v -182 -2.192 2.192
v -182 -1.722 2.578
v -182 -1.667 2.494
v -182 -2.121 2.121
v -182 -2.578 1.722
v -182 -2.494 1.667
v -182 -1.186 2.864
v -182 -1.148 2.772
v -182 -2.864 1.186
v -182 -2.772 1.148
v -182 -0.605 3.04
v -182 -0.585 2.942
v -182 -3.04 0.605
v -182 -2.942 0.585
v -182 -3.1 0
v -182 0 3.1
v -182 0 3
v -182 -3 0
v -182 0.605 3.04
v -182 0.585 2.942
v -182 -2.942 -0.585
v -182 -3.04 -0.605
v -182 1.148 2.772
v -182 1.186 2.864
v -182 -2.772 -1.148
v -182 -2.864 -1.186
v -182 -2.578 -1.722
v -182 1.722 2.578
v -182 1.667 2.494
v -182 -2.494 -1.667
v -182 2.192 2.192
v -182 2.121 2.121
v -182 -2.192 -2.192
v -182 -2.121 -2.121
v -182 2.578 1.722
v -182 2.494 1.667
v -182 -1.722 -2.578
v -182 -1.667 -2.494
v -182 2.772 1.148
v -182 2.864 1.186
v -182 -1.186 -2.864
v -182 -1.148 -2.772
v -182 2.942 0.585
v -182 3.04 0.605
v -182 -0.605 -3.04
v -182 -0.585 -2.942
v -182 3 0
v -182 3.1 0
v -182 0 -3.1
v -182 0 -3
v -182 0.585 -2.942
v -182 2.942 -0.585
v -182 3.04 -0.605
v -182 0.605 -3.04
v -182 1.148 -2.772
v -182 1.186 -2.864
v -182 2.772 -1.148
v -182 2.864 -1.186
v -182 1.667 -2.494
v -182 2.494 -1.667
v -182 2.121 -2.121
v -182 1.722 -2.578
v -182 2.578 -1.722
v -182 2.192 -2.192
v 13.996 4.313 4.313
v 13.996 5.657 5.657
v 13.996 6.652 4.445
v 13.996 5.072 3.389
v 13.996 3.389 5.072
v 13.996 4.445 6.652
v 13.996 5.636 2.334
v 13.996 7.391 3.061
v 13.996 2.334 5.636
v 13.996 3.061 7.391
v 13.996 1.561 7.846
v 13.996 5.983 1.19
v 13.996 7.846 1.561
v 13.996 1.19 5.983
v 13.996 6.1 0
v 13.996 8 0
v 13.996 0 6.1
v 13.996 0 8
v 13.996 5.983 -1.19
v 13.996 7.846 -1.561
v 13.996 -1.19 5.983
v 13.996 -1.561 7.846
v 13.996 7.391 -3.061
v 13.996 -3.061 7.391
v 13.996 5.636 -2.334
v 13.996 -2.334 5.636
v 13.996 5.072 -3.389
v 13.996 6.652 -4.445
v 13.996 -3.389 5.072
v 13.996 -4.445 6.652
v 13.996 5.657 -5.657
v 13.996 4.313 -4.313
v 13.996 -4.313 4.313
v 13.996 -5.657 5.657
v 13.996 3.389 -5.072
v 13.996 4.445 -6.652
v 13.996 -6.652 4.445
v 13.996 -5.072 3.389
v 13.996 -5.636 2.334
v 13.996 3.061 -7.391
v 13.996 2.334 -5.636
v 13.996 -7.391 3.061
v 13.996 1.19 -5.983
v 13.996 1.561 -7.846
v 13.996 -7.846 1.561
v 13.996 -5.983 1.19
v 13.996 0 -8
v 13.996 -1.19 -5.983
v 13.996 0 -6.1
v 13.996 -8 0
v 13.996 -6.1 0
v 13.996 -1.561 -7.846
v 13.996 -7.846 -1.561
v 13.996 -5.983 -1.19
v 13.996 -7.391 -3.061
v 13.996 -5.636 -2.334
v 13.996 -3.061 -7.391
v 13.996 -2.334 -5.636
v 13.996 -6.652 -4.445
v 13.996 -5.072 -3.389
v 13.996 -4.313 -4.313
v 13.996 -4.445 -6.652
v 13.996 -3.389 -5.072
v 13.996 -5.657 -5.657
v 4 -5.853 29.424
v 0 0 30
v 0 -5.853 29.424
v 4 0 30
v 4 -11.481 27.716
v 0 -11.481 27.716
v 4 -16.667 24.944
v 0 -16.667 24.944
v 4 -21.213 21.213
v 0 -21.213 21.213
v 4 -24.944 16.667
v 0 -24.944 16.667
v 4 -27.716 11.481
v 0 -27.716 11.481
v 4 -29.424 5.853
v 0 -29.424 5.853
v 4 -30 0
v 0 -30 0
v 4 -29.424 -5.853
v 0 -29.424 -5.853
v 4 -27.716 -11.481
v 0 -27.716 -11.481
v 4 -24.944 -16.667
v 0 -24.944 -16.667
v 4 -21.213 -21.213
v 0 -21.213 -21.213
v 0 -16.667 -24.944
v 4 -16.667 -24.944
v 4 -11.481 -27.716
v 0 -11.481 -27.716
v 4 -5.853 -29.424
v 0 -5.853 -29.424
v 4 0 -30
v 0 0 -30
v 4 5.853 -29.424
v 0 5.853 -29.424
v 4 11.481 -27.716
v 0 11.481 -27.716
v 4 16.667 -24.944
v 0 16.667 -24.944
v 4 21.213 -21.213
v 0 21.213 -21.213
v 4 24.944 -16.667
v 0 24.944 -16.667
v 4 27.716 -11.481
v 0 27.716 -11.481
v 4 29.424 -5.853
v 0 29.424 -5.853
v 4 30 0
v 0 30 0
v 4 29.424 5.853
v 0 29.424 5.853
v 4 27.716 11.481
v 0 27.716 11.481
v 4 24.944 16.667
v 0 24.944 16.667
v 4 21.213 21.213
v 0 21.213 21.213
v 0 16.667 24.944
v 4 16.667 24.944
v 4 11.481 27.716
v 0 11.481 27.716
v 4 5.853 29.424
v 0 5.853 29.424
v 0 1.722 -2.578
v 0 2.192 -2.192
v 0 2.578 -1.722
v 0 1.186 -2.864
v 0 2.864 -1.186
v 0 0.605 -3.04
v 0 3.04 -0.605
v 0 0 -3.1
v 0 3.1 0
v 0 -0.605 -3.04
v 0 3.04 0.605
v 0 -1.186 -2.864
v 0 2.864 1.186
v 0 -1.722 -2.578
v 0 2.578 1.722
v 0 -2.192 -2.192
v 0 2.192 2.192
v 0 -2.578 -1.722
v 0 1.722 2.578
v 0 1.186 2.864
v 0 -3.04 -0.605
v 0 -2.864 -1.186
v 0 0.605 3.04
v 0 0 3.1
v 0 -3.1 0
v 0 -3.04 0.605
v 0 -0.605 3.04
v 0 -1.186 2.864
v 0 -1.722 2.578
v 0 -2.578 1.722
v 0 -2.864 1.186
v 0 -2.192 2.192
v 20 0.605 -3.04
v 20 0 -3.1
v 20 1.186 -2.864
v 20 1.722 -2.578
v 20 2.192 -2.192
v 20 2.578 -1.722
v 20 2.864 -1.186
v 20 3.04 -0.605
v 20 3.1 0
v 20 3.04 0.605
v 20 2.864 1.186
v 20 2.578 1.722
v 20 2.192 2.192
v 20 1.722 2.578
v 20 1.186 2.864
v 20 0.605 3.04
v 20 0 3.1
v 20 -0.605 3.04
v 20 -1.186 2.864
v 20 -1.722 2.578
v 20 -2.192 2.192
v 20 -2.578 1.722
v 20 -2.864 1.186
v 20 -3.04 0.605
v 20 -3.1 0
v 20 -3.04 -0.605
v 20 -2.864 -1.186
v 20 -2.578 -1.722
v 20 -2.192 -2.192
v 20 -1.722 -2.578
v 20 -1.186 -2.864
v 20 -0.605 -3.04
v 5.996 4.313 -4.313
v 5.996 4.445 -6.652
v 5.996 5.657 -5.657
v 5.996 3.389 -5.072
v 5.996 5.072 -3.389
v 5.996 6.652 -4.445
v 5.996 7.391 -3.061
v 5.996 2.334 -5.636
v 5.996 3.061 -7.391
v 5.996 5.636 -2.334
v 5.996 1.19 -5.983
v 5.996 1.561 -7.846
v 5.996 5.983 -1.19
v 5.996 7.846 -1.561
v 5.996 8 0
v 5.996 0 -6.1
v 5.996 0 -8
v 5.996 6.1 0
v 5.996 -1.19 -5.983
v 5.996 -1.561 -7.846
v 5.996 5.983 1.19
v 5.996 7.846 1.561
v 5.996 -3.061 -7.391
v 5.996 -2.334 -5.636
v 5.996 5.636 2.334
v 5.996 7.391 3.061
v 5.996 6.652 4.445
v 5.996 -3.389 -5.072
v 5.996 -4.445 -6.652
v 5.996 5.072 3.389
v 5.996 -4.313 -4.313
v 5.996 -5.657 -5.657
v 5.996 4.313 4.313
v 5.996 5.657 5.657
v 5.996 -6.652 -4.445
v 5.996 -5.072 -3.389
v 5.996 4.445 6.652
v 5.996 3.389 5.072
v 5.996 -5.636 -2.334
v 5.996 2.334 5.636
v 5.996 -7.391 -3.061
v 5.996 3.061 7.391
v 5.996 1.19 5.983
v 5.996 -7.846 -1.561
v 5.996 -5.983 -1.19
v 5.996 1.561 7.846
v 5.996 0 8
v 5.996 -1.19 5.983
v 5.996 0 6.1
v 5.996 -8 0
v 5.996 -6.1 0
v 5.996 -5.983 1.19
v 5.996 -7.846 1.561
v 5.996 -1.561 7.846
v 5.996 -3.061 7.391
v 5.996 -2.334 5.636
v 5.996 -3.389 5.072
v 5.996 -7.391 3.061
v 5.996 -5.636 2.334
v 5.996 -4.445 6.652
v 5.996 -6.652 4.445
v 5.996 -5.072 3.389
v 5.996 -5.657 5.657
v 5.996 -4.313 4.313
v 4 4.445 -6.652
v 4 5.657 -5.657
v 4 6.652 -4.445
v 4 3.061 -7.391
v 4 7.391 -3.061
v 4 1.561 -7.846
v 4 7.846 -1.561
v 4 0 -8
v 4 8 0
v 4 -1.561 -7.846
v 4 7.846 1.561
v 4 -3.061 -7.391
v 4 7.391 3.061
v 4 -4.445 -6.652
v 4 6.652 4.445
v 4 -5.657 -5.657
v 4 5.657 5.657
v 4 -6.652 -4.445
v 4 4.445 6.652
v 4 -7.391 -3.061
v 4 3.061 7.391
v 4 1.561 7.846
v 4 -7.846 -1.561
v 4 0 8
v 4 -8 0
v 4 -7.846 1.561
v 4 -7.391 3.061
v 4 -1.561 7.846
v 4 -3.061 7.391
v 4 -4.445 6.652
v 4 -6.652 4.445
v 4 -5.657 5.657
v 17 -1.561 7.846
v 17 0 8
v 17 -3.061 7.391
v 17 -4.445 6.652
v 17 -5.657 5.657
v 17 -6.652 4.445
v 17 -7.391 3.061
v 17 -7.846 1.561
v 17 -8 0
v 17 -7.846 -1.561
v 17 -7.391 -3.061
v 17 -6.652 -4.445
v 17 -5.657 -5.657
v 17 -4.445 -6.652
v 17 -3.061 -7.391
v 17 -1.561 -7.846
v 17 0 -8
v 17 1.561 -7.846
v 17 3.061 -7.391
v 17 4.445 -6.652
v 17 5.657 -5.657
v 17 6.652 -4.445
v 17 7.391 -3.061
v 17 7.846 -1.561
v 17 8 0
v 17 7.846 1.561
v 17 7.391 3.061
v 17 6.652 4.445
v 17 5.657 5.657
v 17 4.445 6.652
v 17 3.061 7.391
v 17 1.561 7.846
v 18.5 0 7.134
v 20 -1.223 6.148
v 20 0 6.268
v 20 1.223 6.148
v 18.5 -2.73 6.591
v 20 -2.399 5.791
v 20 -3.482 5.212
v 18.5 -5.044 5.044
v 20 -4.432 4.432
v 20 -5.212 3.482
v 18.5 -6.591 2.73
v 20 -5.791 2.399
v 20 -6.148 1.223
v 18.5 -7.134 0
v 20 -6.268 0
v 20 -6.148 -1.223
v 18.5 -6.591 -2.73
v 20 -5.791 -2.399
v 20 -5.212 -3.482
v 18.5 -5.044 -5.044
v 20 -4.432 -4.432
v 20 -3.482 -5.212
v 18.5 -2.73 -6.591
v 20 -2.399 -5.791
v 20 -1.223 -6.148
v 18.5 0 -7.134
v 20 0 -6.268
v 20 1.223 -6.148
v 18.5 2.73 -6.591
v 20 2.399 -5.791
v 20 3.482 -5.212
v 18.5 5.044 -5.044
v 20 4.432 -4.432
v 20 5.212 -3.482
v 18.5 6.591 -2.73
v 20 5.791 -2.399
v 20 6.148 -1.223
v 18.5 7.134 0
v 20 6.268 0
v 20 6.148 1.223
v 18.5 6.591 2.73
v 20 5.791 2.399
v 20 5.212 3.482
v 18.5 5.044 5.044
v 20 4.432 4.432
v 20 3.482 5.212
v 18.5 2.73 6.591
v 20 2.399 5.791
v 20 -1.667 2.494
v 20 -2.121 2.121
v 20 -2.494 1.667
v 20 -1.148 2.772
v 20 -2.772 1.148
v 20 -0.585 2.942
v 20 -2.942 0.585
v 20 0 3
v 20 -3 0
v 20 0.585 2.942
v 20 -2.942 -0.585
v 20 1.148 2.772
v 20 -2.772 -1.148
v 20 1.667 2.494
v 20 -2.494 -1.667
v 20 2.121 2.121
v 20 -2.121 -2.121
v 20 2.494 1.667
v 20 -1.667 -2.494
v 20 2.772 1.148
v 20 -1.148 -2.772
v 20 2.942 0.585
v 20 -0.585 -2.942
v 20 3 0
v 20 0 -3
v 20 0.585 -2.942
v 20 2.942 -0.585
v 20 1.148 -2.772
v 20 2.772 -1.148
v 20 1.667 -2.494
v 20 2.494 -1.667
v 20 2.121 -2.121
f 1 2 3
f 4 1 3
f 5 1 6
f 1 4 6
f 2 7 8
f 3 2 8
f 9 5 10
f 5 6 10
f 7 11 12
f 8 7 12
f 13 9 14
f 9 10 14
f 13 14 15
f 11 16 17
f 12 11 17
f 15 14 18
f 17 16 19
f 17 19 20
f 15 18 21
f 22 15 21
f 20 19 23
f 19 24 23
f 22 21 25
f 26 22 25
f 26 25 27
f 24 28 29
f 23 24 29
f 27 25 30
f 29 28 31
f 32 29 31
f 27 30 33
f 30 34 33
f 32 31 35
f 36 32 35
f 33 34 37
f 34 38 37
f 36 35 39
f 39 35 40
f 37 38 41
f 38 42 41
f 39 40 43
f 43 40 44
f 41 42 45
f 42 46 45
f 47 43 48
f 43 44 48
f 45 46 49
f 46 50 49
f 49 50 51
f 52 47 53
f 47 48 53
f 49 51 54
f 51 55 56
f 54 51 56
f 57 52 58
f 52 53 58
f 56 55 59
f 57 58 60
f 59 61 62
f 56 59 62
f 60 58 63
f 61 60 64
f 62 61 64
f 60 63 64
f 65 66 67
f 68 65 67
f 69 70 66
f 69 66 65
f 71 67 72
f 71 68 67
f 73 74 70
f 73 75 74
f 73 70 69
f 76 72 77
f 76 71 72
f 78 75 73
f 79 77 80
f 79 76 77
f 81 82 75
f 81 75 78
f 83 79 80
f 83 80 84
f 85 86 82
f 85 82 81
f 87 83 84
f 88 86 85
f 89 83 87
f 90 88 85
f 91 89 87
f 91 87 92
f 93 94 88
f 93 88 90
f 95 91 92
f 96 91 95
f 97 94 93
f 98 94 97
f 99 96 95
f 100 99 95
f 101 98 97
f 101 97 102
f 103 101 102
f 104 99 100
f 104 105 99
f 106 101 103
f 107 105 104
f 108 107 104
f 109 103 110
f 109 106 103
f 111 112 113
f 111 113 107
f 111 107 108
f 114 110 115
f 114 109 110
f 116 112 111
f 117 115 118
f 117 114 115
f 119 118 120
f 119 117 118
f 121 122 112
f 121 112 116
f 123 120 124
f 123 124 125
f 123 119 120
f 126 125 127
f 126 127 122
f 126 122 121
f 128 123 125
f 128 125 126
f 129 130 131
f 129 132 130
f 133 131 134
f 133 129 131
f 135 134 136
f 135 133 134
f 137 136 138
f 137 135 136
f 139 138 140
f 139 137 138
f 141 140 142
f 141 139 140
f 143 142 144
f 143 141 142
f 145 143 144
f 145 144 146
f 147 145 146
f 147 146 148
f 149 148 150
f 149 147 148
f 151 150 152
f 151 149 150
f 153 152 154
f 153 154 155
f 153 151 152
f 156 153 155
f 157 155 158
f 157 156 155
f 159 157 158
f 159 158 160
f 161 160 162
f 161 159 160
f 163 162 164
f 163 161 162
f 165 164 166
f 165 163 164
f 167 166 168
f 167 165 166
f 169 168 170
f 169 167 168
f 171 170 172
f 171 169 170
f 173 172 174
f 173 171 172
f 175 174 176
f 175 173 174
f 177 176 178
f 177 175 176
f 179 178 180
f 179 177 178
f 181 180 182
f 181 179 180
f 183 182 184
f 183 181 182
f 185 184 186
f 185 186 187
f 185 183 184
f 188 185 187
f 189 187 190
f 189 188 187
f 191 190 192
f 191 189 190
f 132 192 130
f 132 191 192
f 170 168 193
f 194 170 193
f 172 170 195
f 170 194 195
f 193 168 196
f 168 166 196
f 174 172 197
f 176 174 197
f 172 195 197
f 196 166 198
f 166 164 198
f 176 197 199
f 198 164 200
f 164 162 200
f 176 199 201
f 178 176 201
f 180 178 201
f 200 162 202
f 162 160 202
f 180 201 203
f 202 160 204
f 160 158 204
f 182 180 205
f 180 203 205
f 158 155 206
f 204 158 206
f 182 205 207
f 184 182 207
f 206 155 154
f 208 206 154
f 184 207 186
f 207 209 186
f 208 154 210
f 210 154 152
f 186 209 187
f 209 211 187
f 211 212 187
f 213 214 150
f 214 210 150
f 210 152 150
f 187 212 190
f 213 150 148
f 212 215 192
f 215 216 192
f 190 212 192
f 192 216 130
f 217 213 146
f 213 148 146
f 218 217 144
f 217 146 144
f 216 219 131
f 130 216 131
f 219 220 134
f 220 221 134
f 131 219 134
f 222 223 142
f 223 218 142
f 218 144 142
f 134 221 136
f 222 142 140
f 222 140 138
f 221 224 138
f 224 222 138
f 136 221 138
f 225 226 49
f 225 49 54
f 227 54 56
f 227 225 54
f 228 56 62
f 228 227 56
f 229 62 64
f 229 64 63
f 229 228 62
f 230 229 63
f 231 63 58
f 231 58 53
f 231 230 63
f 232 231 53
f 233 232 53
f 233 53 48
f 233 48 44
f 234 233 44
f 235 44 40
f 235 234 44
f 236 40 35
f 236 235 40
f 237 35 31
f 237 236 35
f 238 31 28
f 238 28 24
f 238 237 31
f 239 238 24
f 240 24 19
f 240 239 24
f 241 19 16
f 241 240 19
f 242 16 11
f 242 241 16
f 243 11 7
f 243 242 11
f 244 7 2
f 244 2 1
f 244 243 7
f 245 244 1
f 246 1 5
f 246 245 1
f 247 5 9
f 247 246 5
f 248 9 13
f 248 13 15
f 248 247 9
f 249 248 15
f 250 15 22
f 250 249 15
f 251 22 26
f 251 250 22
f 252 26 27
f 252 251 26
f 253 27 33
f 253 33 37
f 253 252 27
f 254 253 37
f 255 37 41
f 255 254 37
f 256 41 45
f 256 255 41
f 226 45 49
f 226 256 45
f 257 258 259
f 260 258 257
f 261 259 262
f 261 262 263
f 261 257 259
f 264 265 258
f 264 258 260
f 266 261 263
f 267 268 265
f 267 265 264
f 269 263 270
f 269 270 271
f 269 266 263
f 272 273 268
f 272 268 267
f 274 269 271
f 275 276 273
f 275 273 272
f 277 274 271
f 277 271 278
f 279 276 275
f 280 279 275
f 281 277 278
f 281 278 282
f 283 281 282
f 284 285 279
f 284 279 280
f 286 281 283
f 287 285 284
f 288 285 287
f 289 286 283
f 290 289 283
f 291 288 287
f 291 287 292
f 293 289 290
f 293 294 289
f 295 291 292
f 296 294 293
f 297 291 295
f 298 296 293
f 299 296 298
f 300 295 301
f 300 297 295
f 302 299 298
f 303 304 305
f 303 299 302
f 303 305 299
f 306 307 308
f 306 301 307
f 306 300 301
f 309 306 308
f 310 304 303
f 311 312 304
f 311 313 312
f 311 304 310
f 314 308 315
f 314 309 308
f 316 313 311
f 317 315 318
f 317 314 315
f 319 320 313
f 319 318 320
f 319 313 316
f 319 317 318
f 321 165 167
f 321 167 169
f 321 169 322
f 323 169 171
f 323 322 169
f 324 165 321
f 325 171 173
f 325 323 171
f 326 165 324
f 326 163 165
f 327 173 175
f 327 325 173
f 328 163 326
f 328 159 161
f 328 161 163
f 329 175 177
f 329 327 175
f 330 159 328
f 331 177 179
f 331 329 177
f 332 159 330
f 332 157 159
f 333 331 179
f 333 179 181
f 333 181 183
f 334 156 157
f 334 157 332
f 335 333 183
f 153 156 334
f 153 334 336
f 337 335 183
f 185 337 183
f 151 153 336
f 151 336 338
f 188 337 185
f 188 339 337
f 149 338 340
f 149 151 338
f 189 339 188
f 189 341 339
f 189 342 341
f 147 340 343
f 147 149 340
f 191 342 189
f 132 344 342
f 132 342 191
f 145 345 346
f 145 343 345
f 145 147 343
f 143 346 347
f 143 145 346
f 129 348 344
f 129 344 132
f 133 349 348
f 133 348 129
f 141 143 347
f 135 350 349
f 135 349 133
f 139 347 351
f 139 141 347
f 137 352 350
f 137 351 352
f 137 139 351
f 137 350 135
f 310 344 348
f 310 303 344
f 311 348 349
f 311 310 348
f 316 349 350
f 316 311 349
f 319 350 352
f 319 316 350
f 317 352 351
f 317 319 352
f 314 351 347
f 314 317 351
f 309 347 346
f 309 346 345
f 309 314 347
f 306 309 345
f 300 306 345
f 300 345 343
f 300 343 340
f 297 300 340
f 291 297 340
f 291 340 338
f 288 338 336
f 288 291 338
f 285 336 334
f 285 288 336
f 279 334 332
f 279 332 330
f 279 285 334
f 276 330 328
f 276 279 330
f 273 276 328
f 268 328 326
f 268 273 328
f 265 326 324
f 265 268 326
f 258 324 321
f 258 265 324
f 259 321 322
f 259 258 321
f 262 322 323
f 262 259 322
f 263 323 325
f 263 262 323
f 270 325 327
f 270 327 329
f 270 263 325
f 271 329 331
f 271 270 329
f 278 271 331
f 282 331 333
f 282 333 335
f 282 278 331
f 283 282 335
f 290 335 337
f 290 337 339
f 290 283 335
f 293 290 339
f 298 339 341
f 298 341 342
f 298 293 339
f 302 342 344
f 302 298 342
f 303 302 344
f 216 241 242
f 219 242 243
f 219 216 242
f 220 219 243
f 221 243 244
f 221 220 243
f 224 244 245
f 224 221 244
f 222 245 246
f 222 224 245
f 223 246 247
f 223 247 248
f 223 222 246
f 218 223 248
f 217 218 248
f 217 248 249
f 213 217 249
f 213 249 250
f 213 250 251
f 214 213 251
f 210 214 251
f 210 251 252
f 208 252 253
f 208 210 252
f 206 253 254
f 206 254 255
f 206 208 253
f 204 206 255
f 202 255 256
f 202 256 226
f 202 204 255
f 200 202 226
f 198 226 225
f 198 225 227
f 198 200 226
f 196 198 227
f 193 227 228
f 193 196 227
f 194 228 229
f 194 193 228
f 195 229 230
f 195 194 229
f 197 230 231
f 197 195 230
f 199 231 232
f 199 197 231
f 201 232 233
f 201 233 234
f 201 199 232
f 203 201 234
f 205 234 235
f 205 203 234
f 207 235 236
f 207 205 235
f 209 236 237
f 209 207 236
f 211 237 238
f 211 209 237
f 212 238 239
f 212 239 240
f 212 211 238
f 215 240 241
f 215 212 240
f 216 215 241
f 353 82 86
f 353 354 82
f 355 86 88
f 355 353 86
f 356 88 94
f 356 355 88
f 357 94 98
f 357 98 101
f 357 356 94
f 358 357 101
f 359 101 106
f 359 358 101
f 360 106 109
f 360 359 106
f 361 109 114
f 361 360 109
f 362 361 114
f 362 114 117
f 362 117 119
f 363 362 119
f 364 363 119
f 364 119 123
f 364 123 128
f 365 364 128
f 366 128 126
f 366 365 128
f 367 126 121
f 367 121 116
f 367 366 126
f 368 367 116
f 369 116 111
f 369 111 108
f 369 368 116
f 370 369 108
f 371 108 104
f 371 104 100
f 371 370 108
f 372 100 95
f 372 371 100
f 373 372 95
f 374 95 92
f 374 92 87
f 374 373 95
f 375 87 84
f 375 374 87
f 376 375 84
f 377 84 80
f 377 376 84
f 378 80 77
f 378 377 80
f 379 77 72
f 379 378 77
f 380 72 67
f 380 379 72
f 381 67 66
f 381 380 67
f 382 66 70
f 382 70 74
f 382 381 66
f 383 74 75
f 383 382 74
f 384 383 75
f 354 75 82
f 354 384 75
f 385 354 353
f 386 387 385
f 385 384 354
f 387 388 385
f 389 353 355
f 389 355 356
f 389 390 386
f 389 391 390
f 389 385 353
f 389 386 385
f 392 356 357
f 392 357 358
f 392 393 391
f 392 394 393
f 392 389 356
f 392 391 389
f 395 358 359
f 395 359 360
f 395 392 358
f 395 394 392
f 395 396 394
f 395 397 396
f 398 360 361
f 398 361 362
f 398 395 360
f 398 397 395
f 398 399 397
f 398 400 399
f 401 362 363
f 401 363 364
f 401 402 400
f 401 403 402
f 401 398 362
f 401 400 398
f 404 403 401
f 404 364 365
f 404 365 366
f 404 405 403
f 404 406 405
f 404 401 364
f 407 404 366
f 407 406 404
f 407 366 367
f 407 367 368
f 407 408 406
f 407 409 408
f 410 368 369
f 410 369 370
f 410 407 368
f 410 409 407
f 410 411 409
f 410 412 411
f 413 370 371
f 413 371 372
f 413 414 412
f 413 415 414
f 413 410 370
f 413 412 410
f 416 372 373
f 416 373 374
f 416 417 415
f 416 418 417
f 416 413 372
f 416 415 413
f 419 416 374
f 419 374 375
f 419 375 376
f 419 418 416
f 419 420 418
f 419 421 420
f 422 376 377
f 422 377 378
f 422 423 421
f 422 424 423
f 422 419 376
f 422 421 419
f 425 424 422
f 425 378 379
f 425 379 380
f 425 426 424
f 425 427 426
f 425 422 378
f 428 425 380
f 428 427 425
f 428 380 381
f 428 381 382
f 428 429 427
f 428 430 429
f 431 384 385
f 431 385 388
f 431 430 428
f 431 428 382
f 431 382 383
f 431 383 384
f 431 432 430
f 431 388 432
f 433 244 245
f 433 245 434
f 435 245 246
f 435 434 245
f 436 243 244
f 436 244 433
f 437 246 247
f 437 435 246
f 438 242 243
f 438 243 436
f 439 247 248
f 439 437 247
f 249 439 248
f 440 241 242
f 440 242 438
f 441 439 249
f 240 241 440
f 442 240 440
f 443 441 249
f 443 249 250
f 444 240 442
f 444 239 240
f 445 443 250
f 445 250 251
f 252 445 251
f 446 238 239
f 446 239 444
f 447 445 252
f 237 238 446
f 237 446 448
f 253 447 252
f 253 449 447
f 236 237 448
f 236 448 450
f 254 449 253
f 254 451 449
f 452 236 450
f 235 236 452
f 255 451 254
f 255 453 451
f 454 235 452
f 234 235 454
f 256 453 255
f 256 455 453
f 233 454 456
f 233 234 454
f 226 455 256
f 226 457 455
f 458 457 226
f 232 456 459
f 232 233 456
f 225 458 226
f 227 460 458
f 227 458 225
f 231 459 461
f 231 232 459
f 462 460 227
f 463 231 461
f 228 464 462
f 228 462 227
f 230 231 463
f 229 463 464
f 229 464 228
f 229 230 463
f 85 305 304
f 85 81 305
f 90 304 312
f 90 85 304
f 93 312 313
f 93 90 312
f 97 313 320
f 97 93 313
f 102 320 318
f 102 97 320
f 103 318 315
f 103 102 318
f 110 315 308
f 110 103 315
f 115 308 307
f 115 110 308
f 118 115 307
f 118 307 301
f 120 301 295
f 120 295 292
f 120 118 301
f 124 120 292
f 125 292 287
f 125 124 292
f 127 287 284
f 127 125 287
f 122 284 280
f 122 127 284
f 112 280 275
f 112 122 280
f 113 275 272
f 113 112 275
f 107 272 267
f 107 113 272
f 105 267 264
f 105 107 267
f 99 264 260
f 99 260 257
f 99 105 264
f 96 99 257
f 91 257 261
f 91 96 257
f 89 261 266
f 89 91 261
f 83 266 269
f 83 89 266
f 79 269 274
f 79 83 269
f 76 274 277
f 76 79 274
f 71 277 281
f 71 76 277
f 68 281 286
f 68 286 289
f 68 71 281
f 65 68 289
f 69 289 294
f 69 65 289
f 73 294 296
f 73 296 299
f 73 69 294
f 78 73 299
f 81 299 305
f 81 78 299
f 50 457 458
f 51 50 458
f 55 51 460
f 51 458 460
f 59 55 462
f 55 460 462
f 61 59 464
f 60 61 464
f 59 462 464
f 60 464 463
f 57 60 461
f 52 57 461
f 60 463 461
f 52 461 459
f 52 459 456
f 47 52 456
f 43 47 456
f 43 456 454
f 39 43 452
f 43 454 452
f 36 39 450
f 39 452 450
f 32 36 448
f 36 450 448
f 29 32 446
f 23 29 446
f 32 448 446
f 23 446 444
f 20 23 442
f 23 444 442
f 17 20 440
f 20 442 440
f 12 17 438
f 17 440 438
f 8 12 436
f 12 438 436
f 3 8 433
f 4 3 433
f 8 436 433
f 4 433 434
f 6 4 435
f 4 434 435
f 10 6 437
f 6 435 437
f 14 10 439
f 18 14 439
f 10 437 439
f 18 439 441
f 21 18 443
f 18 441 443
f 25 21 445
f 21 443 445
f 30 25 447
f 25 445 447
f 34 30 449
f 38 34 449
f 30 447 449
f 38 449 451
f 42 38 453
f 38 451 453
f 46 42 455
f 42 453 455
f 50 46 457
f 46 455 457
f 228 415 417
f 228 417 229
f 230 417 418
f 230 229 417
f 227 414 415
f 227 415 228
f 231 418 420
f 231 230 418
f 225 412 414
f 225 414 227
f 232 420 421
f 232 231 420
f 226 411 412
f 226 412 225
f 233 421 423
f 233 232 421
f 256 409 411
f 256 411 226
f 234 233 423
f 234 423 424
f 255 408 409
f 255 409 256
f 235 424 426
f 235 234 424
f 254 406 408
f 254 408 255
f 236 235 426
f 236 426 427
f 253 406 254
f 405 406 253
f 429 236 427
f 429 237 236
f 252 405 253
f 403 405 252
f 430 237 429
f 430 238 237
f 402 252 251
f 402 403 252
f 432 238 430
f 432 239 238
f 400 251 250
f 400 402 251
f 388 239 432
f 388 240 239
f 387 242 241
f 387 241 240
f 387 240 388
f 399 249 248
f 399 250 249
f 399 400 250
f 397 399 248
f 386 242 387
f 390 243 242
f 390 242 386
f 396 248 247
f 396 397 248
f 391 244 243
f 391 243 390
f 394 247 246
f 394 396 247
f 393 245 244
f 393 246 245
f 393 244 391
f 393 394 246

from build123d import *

# Parameters (mm, degrees)
SKETCH_3_R      = 3.1
SKETCH_3_R_2    = 3
EXTRUDE_1_DEPTH = 202


with BuildPart() as part:
    # Эскиз1 → Повернуть1 (revolve)
    with BuildSketch(Plane.XY, mode=Mode.PRIVATE) as revolve_1_sk:
        Polygon((0, 21.958452658), (0, 30), (4, 30), (4, 8), (5.995778665, 8), (5.995778665, 6.1), (13.995778665, 6.1), (13.995778665, 8), (17, 8), (20, 6.267949192), (20, 3.1), (0, 3.1), align=None)
    revolve(revolve_1_sk.sketch.rotate(Axis((0, 0, 0), (1, 0, 0)), 90), axis=Axis((0, 0, 0), (1, 0, 0)))


with BuildPart() as body_2:
    # Эскиз3 → Бобышка-Вытянуть1 (new body)
    with BuildSketch(Plane(origin=(20, 0, 0), x_dir=(0, 0, -1), z_dir=(1, 0, 0))):
        Circle(SKETCH_3_R)
        Circle(SKETCH_3_R_2, mode=Mode.SUBTRACT)
    extrude(amount=-EXTRUDE_1_DEPTH)


solid = Compound([part.part, body_2.part])
